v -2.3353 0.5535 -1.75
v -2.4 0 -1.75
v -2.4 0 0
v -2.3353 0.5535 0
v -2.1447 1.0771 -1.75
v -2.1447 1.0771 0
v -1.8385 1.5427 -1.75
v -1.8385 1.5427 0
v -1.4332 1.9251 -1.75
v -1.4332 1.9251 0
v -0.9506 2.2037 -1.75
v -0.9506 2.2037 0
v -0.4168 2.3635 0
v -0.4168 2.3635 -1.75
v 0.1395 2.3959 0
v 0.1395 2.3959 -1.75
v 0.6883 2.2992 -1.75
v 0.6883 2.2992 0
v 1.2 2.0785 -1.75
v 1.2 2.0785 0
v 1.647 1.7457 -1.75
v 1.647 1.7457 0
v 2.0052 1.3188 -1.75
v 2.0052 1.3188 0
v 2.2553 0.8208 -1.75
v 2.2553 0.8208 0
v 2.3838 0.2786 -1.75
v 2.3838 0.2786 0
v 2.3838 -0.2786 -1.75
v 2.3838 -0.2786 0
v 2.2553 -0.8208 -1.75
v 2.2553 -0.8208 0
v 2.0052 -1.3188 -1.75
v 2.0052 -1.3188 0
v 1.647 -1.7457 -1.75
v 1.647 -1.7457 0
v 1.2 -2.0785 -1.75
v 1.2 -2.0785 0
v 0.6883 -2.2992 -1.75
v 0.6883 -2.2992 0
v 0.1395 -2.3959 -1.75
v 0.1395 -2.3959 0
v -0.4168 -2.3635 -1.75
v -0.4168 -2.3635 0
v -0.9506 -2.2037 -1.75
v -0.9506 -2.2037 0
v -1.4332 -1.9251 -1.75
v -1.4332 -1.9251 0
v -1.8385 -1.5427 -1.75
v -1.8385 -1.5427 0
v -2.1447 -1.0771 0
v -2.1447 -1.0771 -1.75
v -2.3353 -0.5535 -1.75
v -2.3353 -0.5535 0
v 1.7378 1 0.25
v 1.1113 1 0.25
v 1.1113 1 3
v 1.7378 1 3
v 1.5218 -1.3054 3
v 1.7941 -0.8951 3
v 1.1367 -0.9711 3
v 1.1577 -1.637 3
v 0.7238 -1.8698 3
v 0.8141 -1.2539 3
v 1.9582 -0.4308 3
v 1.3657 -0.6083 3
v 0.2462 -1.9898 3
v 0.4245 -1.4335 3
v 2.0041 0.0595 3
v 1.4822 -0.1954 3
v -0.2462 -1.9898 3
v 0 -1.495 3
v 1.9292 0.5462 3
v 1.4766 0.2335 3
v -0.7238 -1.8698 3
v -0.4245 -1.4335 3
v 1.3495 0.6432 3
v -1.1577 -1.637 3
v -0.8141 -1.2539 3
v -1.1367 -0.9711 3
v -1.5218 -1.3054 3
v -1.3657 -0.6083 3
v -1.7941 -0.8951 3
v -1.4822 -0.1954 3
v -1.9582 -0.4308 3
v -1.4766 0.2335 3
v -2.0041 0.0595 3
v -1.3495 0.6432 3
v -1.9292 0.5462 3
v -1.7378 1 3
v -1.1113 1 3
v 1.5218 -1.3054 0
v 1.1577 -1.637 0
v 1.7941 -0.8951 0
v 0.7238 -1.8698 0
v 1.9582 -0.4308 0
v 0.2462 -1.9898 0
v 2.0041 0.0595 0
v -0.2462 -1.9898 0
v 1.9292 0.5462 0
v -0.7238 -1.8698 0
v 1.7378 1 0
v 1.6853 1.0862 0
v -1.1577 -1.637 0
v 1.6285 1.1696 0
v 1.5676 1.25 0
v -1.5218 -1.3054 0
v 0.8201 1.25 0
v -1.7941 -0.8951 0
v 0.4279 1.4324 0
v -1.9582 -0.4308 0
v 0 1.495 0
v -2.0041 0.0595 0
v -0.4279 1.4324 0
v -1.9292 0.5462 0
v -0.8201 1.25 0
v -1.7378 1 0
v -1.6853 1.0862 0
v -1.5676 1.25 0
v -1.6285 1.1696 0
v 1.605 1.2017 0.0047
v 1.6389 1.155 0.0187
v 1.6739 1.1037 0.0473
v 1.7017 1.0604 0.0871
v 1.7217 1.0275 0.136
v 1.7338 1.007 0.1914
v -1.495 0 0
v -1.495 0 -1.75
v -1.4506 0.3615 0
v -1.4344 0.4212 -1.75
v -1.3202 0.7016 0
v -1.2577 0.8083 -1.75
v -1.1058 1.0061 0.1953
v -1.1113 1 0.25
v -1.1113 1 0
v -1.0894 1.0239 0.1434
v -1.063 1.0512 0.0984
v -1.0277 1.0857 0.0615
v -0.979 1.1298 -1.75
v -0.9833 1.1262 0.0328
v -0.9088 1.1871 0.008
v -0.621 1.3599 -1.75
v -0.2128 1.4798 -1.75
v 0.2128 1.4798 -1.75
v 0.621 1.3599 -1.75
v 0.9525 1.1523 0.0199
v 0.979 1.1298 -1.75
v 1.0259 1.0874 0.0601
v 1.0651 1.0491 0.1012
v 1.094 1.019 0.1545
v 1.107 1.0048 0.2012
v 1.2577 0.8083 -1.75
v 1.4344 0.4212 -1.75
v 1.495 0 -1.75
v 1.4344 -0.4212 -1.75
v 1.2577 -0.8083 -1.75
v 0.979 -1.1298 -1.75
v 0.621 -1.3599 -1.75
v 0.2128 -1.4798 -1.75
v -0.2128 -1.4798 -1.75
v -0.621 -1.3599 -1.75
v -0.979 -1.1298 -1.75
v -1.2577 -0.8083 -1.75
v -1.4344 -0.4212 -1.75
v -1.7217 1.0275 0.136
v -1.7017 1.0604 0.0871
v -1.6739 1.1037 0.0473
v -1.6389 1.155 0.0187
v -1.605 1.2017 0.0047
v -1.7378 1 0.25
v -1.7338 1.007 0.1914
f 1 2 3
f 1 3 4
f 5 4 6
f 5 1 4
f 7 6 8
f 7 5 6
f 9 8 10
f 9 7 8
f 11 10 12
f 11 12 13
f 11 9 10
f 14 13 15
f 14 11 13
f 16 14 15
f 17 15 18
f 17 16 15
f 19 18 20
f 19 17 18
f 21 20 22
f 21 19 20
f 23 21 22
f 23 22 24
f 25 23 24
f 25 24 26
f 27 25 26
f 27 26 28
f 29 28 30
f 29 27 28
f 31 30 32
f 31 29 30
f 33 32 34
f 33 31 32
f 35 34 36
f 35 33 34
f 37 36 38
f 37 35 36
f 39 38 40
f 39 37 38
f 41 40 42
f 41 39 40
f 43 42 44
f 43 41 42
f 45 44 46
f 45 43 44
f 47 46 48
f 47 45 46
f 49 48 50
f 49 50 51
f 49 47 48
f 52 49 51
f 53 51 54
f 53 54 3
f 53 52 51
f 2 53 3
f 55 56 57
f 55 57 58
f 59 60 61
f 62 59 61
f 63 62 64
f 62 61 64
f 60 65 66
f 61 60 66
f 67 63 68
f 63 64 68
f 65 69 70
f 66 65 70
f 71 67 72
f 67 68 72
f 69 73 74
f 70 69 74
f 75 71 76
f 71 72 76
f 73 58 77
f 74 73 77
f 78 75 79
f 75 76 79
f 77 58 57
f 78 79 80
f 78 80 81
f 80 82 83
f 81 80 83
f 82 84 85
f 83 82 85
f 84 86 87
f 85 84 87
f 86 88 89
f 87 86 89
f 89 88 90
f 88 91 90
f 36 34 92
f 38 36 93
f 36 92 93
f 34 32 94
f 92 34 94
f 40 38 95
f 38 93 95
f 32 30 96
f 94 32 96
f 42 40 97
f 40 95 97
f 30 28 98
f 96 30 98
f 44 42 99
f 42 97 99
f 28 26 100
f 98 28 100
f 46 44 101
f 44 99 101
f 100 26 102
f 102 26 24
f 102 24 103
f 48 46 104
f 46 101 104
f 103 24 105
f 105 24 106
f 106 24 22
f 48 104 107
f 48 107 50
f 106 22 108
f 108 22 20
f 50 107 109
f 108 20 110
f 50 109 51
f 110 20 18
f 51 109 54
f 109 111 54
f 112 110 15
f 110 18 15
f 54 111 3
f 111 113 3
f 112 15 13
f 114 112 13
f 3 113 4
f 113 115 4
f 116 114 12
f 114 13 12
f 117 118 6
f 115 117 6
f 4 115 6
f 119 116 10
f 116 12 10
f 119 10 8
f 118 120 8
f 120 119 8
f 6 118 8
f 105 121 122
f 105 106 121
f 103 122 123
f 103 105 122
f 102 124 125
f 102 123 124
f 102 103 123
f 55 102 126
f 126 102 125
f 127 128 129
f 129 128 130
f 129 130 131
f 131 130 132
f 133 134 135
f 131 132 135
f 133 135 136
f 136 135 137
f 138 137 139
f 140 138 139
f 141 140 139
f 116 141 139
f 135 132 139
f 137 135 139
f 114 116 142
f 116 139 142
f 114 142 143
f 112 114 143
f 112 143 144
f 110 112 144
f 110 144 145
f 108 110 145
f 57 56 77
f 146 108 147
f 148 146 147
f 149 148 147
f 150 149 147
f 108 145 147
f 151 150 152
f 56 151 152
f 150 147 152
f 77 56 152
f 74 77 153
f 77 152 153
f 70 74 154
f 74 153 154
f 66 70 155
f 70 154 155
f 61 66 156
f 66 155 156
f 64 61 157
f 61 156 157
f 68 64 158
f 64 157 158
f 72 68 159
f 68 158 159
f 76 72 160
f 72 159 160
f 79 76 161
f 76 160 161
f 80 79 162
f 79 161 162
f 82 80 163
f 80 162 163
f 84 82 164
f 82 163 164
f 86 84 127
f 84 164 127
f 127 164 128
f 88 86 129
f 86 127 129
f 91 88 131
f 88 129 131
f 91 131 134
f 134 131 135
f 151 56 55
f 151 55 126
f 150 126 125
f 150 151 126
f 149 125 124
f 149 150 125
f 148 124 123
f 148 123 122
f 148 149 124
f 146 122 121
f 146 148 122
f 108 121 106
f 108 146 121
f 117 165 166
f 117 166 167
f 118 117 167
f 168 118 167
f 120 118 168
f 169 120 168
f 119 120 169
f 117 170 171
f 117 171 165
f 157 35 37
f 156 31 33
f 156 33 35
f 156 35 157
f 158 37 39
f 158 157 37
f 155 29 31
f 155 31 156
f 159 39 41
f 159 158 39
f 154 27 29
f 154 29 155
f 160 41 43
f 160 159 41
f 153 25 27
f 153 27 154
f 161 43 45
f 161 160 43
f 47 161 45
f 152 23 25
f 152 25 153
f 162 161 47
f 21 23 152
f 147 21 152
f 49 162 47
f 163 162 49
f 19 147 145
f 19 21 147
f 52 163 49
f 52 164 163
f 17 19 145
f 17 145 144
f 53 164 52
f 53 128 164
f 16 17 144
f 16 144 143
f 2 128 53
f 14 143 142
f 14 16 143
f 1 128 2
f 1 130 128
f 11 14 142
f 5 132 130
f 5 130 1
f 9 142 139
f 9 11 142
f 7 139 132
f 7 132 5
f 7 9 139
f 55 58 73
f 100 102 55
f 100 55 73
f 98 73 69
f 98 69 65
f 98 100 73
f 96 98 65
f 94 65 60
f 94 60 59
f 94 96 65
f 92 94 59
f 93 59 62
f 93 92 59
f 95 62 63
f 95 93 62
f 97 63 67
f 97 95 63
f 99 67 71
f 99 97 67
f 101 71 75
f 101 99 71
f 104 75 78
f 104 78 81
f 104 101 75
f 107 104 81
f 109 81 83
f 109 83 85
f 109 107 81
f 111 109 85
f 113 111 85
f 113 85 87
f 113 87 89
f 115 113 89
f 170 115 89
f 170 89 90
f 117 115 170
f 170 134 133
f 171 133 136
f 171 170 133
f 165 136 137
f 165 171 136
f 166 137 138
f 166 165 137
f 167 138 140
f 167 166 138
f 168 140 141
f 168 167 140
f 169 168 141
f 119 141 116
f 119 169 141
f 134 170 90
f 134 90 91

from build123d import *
from build123d.topology import SkipClean

# Parameters (mm, degrees)
BOSS_EXTRUDE1_DEPTH = 3
BOSS_EXTRUDE2_START = 1.75
SKETCH2_R           = 2.4
SKETCH2_R_2         = 1.495
BOSS_EXTRUDE2_DEPTH = 1.75
FILLET1_R           = 0.25


with BuildPart() as part:
    # Sketch1 → Boss-Extrude1 (new body)
    with BuildSketch(Plane.XY):
        with BuildLine():
            Line((-1.737821913, 1), (-1.111316787, 1))
            ThreePointArc((-1.111316787, 1), (0, -1.495), (1.111316787, 1))
            Line((1.111316787, 1), (1.737821913, 1))
            ThreePointArc((1.737821913, 1), (0, -2.005), (-1.737821913, 1))
        make_face()
    extrude(amount=BOSS_EXTRUDE1_DEPTH)

    # Sketch2 → Boss-Extrude2 (add)
    with SkipClean():  # the faces are left unmerged after this step: merging them gives an invalid solid
        with BuildSketch(Plane(origin=(0, 0, 0), x_dir=(-1, 0, 0), z_dir=(0, 0, -1)).offset(BOSS_EXTRUDE2_START)):
            Circle(SKETCH2_R)
            Circle(SKETCH2_R_2, mode=Mode.SUBTRACT)
        extrude(amount=-BOSS_EXTRUDE2_DEPTH)

    # Fillet1
    # the kernel refuses this fillet: 0.25 mm, written as the material it adds along each edge
    with BuildSketch(Plane(origin=(-2.362821913, 1, 0), x_dir=(0, 0, 1), z_dir=(1, 0, 0))) as fillet1_piece_1_section:
        with BuildLine():
            CenterArc((FILLET1_R, -FILLET1_R), FILLET1_R, 90, 90)
            Line((0, -FILLET1_R), (0, 0))
            Line((0, 0), (FILLET1_R, 0))
        make_face()
    fillet1_piece_1 = extrude(amount=1.876505126, mode=Mode.PRIVATE)
    fillet1_piece_1 = fillet1_piece_1 & Plane(origin=(0, 0, 0.055527153), x_dir=(0.8667440960723748, 0.49875311720698257, 0), z_dir=(0, 0, -1)) * Cylinder(2.005, 5, mode=Mode.PRIVATE)
    fillet1_piece_1 = fillet1_piece_1 - Plane(origin=(0, 0, 0.055527153), x_dir=(-0.7433557100464799, 0.6688963210702342, 0), z_dir=(0, 0, -1)) * Cylinder(1.495, 5, mode=Mode.PRIVATE)
    add(fillet1_piece_1)
    with BuildSketch(Plane(origin=(0.486316787, 1, 0), x_dir=(0, 0, 1), z_dir=(1, 0, 0))) as fillet1_piece_2_section:
        with BuildLine():
            CenterArc((FILLET1_R, -FILLET1_R), FILLET1_R, 90, 90)
            Line((0, -FILLET1_R), (0, 0))
            Line((0, 0), (FILLET1_R, 0))
        make_face()
    fillet1_piece_2 = extrude(amount=1.876505126, mode=Mode.PRIVATE)
    fillet1_piece_2 = fillet1_piece_2 & Plane(origin=(0, 0, 0.055527144), x_dir=(0.8667440960723748, 0.49875311720698257, 0), z_dir=(0, 0, -1)) * Cylinder(2.005, 5, mode=Mode.PRIVATE)
    fillet1_piece_2 = fillet1_piece_2 - Plane(origin=(0, 0, 0.055527144), x_dir=(-0.7433557100464799, 0.6688963210702342, 0), z_dir=(0, 0, -1)) * Cylinder(1.495, 5, mode=Mode.PRIVATE)
    add(fillet1_piece_2)


solid = part.part
